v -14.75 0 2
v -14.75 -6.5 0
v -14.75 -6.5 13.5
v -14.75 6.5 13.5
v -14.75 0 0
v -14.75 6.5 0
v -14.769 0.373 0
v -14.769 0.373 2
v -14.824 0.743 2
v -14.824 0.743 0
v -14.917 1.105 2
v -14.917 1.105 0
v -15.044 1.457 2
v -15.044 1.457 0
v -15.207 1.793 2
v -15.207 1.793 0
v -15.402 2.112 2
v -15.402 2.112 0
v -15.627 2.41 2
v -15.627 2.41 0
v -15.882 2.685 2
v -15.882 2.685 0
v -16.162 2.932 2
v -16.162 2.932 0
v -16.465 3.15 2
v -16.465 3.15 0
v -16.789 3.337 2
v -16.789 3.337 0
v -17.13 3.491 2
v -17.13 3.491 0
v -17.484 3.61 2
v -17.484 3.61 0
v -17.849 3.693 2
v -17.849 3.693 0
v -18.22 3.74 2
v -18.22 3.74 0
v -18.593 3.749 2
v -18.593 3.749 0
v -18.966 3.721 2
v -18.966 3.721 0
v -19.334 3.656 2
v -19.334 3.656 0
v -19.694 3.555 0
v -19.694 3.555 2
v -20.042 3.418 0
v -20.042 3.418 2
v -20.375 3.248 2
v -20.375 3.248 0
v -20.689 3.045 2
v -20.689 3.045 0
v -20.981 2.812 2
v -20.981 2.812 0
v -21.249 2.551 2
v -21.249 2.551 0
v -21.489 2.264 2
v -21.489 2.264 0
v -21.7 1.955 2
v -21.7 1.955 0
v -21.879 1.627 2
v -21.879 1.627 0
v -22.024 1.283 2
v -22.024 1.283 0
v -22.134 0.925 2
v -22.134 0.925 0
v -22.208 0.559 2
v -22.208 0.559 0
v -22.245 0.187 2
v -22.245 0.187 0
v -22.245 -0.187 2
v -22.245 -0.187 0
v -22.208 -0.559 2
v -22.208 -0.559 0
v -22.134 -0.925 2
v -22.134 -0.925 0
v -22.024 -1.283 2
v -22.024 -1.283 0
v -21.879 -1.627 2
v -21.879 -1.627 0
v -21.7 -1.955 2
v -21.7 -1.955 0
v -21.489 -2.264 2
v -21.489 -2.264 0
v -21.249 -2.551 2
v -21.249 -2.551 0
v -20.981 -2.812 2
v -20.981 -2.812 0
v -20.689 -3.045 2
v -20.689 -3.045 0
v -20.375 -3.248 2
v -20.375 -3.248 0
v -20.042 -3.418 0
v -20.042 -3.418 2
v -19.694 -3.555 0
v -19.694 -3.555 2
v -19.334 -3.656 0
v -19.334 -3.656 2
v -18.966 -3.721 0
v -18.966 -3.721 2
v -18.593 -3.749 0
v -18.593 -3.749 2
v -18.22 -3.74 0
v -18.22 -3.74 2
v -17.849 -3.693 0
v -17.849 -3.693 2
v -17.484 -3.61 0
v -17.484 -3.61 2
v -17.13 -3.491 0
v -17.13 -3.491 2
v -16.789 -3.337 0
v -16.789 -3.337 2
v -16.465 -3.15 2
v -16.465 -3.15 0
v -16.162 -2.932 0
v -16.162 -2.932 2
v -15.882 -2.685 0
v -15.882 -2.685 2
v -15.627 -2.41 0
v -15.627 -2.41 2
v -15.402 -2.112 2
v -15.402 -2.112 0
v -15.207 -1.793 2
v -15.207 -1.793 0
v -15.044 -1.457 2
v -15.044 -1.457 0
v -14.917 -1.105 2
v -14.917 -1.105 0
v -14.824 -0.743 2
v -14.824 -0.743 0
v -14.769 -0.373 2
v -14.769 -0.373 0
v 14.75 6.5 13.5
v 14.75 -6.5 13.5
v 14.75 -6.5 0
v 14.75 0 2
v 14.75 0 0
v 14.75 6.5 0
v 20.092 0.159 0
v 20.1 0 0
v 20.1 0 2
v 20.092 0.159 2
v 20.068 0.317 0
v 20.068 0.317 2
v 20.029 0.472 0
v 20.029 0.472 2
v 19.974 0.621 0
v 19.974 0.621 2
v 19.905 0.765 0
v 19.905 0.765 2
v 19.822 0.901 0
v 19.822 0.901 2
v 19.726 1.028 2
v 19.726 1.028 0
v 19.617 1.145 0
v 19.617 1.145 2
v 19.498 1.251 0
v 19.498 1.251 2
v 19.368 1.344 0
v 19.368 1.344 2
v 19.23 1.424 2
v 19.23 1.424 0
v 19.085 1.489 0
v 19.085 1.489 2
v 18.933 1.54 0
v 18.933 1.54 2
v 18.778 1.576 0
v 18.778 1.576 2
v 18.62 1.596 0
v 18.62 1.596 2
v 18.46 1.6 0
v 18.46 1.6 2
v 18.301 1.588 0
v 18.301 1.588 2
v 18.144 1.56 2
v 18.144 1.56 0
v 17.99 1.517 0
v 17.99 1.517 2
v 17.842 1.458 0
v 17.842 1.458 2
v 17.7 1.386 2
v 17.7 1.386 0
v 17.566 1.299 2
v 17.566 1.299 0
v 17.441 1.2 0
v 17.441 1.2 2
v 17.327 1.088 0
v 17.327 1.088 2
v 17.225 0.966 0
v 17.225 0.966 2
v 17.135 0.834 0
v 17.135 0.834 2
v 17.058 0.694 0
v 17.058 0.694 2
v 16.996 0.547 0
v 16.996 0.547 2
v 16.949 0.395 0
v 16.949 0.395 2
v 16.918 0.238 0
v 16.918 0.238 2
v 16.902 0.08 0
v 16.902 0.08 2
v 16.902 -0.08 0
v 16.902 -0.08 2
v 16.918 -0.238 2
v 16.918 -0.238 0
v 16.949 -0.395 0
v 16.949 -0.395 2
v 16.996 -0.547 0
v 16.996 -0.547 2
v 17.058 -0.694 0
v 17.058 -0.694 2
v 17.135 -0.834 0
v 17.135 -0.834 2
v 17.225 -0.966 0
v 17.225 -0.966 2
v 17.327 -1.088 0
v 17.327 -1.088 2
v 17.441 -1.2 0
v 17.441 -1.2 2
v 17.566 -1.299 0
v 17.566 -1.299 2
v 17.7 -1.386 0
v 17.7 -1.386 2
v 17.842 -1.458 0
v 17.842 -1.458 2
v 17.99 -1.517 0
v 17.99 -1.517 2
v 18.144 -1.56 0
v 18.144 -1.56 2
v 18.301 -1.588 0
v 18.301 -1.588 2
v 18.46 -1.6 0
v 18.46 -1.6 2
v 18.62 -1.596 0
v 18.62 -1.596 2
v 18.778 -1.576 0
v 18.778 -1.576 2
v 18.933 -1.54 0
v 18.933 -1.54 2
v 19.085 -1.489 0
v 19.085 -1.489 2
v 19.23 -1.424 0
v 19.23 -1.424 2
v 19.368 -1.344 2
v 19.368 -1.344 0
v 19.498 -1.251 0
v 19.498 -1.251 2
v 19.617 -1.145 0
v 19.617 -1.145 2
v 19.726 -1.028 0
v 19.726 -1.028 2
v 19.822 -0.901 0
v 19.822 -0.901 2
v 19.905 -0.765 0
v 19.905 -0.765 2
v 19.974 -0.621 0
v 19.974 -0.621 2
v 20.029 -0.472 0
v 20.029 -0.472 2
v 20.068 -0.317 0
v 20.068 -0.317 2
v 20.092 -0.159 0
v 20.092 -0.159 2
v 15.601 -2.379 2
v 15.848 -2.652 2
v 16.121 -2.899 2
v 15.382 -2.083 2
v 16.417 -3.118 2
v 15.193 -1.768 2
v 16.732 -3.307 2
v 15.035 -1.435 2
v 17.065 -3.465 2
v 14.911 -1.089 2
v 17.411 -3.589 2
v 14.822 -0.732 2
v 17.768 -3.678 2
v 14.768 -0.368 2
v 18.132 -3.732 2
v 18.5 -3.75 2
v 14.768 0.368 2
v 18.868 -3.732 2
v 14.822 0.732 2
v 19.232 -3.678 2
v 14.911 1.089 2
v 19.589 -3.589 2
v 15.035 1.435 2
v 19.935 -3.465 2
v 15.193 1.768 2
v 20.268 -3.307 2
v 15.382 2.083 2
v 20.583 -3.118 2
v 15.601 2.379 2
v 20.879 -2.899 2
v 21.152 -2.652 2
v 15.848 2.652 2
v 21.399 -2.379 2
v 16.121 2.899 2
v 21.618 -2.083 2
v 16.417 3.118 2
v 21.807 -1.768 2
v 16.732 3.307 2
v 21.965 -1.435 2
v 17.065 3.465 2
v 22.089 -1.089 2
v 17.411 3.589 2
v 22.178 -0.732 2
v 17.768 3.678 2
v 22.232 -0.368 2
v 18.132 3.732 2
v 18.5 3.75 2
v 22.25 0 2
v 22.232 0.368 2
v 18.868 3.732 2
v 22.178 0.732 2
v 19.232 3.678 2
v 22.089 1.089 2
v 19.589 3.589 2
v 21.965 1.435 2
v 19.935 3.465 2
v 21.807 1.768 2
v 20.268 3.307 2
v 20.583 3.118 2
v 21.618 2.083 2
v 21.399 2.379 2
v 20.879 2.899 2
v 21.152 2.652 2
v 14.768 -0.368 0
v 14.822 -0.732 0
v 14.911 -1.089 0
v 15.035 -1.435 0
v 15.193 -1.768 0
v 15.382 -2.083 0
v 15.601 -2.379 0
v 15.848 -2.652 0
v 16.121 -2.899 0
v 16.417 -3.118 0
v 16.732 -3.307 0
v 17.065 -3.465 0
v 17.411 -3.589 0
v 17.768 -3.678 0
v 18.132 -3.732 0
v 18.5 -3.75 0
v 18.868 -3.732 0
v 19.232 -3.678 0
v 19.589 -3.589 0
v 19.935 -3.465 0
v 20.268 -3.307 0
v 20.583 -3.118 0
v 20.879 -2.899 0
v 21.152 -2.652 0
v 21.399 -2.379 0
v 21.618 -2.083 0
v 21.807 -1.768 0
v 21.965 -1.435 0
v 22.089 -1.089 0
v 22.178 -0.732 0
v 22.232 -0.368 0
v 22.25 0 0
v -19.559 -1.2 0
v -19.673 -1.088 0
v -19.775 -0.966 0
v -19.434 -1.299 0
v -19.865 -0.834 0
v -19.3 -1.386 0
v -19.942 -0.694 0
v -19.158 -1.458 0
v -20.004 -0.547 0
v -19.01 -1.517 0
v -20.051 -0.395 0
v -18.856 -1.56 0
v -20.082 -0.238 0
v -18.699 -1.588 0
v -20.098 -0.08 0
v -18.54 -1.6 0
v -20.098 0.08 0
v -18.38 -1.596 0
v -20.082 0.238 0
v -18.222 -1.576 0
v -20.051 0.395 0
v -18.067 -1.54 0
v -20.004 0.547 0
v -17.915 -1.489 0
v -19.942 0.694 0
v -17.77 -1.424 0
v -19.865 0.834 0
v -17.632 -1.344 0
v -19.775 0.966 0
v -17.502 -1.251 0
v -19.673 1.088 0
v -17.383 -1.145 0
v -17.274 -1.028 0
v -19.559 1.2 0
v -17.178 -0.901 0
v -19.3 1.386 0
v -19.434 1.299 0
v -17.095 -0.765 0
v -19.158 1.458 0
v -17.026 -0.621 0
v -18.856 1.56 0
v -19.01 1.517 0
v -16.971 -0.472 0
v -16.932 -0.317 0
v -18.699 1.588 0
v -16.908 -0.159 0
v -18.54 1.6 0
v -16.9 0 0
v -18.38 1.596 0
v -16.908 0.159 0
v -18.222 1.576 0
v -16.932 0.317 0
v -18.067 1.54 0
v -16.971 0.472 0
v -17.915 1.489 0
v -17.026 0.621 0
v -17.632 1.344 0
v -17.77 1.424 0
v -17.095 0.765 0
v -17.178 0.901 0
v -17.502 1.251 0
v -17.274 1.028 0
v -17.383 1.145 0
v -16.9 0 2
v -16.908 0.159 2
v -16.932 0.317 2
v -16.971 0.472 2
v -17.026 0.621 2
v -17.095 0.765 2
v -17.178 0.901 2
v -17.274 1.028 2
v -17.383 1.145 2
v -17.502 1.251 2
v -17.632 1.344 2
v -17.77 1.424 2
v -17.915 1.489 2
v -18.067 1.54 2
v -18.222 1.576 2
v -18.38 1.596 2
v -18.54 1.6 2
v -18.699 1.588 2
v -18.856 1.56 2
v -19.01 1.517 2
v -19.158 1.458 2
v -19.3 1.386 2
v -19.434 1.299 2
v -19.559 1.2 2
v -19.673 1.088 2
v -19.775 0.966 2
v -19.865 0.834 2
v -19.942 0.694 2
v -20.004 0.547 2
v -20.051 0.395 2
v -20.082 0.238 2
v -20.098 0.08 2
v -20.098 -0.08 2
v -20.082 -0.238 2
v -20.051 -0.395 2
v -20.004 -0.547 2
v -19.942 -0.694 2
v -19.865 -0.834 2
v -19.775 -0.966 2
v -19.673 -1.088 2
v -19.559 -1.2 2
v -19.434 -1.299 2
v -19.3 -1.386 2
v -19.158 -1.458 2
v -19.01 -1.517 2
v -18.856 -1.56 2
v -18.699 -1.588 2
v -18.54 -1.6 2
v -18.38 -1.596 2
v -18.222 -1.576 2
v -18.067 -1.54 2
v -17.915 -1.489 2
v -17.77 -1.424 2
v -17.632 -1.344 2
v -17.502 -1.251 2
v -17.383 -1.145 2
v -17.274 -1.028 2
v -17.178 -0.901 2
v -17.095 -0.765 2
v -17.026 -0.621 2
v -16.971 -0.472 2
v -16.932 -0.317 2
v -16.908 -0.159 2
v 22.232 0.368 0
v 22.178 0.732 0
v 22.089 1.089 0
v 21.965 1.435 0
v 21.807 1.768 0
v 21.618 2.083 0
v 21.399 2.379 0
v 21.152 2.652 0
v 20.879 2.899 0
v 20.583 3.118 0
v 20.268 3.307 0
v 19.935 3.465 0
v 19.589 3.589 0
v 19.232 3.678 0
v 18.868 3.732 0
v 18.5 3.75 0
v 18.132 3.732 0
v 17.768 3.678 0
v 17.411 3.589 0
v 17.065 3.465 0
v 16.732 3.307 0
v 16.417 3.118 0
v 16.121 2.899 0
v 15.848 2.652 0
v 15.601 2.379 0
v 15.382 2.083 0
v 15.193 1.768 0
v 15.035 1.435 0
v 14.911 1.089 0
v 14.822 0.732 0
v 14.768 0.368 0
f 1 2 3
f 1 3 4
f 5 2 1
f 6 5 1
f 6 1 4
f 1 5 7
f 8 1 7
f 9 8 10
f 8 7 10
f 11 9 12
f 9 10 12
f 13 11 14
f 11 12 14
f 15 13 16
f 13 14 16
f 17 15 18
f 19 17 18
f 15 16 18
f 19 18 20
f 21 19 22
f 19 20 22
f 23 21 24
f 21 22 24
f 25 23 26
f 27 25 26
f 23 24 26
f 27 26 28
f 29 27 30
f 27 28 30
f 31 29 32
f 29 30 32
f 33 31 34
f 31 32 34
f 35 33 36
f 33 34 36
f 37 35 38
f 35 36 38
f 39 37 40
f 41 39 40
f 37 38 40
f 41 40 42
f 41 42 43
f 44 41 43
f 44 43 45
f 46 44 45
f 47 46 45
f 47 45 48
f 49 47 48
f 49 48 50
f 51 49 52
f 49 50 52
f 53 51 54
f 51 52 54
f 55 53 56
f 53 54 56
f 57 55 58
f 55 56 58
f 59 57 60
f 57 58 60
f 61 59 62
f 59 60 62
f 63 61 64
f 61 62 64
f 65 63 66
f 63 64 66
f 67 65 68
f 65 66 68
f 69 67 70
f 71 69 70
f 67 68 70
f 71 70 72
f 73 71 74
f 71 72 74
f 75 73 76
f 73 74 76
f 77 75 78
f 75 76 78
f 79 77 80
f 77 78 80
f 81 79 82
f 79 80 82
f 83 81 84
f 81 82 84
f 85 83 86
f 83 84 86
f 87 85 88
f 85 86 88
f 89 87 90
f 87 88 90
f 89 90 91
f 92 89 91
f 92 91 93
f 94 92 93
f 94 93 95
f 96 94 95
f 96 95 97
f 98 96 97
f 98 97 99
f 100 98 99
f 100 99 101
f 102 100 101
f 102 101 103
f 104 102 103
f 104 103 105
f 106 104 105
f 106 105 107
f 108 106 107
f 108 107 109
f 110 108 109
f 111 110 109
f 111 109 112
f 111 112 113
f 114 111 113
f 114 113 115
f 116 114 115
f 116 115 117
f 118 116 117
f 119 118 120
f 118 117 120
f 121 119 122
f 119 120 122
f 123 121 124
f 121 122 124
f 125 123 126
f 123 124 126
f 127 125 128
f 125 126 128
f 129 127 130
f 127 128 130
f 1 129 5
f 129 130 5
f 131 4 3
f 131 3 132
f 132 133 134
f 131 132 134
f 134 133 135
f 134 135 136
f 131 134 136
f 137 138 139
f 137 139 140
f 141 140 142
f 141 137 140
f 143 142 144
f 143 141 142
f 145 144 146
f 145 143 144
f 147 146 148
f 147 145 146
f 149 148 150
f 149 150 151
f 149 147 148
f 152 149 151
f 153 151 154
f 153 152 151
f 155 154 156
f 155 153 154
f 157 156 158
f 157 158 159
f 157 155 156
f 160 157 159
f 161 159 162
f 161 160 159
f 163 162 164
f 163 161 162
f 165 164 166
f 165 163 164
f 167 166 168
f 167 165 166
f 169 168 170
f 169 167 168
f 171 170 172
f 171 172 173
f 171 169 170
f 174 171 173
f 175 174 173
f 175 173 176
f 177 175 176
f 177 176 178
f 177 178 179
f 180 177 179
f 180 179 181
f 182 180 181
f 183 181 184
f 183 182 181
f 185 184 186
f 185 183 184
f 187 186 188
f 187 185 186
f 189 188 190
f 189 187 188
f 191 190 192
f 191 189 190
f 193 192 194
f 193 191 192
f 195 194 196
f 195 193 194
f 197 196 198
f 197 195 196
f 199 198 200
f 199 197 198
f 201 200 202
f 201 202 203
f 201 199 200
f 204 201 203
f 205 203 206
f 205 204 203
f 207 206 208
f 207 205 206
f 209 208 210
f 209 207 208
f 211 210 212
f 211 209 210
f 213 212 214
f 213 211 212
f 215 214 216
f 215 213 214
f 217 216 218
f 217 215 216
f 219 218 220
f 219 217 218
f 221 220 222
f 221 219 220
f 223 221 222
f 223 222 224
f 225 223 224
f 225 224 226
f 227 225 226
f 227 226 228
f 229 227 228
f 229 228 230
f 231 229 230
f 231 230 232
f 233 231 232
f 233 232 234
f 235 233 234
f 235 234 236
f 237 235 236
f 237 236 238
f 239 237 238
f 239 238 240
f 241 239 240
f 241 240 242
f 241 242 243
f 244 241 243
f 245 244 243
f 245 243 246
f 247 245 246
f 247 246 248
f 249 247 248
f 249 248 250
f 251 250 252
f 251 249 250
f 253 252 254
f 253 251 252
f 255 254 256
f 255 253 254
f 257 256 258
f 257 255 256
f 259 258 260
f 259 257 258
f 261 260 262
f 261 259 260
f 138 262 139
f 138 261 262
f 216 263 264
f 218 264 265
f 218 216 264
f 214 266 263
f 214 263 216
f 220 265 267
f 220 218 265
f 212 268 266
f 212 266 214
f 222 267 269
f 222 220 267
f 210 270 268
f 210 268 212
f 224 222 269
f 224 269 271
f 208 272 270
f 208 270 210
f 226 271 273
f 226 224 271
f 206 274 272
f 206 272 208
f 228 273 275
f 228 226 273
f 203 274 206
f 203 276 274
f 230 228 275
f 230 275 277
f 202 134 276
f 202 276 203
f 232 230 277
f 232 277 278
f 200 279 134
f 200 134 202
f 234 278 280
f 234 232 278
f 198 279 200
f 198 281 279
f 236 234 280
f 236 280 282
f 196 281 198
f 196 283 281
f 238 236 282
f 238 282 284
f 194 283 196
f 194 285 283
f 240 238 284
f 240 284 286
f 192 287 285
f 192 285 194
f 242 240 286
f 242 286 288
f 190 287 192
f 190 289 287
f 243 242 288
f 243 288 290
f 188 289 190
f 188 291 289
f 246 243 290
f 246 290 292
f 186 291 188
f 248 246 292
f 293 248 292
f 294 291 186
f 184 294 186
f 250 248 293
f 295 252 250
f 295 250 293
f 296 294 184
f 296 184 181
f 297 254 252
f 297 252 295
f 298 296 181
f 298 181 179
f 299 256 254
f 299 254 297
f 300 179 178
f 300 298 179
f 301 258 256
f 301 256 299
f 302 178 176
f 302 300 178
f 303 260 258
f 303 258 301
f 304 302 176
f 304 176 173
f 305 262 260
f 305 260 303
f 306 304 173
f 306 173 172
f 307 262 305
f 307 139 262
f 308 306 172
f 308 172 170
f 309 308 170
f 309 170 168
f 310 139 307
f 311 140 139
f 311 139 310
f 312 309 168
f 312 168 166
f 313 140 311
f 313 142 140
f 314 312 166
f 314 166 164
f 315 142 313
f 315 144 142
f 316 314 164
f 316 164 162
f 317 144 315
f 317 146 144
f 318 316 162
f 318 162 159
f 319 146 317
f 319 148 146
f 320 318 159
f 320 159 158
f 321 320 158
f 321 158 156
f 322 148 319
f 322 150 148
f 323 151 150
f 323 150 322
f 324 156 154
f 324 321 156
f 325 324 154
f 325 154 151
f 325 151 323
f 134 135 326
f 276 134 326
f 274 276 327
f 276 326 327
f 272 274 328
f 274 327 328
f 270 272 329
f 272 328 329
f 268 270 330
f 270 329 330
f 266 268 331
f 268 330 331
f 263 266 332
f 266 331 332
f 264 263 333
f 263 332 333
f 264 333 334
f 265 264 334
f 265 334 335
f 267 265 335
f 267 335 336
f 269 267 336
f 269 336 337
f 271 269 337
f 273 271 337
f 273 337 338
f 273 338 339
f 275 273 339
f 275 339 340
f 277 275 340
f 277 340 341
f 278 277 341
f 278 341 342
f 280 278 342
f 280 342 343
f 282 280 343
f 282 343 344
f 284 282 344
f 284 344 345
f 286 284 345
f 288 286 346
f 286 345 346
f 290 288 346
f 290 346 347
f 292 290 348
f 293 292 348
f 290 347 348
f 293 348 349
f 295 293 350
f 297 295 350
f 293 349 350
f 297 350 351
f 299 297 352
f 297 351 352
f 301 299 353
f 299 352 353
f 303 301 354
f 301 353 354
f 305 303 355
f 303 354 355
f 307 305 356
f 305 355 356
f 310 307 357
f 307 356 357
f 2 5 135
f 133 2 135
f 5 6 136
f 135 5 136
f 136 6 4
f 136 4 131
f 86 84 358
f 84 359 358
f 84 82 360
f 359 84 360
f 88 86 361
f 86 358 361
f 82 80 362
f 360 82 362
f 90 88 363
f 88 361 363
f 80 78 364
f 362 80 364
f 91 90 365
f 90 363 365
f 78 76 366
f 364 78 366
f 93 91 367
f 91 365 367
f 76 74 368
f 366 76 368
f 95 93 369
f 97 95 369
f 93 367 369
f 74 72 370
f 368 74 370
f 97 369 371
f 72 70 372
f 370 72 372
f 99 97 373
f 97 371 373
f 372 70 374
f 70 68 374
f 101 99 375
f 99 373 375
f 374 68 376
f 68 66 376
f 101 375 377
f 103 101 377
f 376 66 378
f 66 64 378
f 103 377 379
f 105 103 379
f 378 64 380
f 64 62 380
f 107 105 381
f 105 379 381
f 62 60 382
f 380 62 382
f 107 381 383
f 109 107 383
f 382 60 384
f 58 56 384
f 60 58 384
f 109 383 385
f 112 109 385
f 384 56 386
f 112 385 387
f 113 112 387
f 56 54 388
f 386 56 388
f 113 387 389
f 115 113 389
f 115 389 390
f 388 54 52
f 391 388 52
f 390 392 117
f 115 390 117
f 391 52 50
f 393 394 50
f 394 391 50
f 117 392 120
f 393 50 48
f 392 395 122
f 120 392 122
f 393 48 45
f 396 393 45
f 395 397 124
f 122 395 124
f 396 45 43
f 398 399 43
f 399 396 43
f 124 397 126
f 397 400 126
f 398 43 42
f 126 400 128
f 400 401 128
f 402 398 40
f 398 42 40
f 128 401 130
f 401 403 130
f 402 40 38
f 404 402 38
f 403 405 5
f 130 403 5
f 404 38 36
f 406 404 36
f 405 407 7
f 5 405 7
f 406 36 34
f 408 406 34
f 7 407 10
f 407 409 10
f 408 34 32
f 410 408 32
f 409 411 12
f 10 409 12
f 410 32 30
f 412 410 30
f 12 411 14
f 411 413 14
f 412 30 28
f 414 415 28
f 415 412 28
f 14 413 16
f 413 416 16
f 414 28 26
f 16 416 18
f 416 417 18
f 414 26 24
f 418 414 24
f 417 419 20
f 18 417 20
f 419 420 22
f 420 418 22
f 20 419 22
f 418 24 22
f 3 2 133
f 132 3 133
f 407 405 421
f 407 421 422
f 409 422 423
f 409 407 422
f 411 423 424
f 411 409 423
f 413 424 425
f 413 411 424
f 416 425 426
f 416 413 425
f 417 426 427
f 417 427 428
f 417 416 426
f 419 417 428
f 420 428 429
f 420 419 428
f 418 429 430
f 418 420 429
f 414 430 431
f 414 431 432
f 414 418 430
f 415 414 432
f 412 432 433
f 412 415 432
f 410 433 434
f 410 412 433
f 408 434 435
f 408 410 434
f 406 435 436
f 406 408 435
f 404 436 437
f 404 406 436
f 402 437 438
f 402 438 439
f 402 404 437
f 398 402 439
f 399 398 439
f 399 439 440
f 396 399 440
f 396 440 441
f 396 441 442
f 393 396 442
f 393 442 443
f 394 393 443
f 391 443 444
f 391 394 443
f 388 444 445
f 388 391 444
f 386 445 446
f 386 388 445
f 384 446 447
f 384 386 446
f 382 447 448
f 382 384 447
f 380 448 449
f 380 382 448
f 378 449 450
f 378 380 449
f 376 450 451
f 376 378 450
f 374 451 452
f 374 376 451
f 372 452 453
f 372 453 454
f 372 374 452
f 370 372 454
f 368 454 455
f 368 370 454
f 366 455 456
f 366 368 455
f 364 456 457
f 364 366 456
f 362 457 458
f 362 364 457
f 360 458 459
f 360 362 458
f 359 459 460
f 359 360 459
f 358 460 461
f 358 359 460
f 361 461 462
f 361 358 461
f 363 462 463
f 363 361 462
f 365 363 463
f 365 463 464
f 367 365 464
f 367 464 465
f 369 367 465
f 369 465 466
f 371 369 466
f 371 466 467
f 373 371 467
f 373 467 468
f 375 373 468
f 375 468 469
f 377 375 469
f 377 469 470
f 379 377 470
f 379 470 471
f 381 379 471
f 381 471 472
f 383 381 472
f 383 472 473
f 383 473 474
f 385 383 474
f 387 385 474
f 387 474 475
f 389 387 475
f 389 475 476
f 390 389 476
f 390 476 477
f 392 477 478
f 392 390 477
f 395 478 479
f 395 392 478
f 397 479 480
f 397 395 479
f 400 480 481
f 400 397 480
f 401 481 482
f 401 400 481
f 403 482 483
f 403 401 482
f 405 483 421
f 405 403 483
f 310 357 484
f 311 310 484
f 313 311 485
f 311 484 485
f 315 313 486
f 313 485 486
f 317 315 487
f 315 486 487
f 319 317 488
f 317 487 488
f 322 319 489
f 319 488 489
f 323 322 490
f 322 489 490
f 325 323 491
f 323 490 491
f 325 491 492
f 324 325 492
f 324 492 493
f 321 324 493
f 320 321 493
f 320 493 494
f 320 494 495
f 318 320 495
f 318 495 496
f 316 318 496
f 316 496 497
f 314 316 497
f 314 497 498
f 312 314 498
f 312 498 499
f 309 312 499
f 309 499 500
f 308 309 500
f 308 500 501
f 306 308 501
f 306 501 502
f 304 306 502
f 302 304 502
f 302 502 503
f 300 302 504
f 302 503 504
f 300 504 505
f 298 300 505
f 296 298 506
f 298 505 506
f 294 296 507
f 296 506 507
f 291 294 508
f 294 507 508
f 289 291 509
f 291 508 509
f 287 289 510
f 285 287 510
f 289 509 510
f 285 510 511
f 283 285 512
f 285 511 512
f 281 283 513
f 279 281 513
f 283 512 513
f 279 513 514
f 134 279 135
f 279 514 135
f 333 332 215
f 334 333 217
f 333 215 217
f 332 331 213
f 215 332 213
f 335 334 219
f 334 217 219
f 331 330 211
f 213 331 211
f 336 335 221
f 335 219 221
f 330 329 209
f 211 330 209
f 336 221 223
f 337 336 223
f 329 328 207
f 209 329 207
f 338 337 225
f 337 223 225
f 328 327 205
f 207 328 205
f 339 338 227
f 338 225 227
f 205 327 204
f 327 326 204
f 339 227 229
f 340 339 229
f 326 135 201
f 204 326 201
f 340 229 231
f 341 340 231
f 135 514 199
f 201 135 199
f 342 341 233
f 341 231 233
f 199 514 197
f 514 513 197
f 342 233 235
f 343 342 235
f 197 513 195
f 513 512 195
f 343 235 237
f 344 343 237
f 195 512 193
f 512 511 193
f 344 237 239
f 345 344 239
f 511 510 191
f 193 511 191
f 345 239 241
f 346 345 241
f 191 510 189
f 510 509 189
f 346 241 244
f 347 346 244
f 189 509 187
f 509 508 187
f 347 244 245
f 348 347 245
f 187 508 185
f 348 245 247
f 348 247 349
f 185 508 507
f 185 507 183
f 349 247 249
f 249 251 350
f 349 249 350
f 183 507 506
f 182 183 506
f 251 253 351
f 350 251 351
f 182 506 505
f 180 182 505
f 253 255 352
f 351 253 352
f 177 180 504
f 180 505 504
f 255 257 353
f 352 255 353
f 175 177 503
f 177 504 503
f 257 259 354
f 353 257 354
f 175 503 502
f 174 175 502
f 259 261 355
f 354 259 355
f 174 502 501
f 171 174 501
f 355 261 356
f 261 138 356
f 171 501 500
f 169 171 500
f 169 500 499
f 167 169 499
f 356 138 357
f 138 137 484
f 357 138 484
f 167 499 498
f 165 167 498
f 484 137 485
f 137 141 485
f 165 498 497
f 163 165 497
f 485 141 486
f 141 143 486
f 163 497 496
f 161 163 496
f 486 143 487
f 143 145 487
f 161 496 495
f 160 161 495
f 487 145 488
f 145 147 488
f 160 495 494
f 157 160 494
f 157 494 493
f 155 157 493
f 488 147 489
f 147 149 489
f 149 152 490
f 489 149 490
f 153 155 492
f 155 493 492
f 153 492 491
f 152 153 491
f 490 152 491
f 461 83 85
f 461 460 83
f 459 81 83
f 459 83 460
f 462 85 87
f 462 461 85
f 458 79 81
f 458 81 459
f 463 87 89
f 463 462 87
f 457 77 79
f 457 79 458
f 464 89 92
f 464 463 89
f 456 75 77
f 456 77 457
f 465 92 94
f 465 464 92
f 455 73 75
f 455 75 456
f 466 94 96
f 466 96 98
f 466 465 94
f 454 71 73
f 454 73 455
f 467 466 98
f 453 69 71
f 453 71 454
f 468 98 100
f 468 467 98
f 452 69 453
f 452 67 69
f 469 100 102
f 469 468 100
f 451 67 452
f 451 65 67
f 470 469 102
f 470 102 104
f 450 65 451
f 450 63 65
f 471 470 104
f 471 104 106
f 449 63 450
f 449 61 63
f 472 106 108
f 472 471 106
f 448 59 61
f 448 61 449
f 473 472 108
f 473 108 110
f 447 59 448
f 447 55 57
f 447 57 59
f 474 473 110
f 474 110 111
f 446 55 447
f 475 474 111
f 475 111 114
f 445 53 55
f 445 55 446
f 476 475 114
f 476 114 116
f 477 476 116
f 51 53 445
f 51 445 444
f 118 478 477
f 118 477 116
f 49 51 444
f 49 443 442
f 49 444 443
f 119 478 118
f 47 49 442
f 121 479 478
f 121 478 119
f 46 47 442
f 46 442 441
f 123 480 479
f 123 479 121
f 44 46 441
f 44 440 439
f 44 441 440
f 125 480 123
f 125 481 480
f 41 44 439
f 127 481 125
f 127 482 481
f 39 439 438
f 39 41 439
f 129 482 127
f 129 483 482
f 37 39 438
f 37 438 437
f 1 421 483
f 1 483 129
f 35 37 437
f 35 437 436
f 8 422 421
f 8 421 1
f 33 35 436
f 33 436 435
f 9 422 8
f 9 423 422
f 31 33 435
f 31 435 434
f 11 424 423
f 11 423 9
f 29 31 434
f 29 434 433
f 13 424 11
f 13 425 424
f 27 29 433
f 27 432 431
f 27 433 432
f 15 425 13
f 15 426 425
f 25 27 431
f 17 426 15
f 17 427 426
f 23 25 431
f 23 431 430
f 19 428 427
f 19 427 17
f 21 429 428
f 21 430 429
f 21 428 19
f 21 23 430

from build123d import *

# Parameters (mm, degrees)
F0_W     = 29.5
F0_H     = 13
F2_DEPTH = 13.5
F1_R     = 3.75
F1_R_2   = 1.6
F3_DEPTH = 2


with BuildPart() as f2:
    # F0 (on Top) → F2 (new body)
    with BuildSketch(Plane.XY):
        Rectangle(F0_W, F0_H)
    extrude(amount=F2_DEPTH)

    # F1 (on Top) → F3 (join)
    with BuildSketch(Plane.XY):
        with Locations((-18.5, 0)):
            Circle(F1_R)
        with Locations((-18.5, 0)):
            Circle(F1_R_2, mode=Mode.SUBTRACT)
        with Locations((18.5, 0)):
            Circle(F1_R)
        with Locations((18.5, 0)):
            Circle(F1_R_2, mode=Mode.SUBTRACT)
    extrude(amount=F3_DEPTH)


solid = f2.part
